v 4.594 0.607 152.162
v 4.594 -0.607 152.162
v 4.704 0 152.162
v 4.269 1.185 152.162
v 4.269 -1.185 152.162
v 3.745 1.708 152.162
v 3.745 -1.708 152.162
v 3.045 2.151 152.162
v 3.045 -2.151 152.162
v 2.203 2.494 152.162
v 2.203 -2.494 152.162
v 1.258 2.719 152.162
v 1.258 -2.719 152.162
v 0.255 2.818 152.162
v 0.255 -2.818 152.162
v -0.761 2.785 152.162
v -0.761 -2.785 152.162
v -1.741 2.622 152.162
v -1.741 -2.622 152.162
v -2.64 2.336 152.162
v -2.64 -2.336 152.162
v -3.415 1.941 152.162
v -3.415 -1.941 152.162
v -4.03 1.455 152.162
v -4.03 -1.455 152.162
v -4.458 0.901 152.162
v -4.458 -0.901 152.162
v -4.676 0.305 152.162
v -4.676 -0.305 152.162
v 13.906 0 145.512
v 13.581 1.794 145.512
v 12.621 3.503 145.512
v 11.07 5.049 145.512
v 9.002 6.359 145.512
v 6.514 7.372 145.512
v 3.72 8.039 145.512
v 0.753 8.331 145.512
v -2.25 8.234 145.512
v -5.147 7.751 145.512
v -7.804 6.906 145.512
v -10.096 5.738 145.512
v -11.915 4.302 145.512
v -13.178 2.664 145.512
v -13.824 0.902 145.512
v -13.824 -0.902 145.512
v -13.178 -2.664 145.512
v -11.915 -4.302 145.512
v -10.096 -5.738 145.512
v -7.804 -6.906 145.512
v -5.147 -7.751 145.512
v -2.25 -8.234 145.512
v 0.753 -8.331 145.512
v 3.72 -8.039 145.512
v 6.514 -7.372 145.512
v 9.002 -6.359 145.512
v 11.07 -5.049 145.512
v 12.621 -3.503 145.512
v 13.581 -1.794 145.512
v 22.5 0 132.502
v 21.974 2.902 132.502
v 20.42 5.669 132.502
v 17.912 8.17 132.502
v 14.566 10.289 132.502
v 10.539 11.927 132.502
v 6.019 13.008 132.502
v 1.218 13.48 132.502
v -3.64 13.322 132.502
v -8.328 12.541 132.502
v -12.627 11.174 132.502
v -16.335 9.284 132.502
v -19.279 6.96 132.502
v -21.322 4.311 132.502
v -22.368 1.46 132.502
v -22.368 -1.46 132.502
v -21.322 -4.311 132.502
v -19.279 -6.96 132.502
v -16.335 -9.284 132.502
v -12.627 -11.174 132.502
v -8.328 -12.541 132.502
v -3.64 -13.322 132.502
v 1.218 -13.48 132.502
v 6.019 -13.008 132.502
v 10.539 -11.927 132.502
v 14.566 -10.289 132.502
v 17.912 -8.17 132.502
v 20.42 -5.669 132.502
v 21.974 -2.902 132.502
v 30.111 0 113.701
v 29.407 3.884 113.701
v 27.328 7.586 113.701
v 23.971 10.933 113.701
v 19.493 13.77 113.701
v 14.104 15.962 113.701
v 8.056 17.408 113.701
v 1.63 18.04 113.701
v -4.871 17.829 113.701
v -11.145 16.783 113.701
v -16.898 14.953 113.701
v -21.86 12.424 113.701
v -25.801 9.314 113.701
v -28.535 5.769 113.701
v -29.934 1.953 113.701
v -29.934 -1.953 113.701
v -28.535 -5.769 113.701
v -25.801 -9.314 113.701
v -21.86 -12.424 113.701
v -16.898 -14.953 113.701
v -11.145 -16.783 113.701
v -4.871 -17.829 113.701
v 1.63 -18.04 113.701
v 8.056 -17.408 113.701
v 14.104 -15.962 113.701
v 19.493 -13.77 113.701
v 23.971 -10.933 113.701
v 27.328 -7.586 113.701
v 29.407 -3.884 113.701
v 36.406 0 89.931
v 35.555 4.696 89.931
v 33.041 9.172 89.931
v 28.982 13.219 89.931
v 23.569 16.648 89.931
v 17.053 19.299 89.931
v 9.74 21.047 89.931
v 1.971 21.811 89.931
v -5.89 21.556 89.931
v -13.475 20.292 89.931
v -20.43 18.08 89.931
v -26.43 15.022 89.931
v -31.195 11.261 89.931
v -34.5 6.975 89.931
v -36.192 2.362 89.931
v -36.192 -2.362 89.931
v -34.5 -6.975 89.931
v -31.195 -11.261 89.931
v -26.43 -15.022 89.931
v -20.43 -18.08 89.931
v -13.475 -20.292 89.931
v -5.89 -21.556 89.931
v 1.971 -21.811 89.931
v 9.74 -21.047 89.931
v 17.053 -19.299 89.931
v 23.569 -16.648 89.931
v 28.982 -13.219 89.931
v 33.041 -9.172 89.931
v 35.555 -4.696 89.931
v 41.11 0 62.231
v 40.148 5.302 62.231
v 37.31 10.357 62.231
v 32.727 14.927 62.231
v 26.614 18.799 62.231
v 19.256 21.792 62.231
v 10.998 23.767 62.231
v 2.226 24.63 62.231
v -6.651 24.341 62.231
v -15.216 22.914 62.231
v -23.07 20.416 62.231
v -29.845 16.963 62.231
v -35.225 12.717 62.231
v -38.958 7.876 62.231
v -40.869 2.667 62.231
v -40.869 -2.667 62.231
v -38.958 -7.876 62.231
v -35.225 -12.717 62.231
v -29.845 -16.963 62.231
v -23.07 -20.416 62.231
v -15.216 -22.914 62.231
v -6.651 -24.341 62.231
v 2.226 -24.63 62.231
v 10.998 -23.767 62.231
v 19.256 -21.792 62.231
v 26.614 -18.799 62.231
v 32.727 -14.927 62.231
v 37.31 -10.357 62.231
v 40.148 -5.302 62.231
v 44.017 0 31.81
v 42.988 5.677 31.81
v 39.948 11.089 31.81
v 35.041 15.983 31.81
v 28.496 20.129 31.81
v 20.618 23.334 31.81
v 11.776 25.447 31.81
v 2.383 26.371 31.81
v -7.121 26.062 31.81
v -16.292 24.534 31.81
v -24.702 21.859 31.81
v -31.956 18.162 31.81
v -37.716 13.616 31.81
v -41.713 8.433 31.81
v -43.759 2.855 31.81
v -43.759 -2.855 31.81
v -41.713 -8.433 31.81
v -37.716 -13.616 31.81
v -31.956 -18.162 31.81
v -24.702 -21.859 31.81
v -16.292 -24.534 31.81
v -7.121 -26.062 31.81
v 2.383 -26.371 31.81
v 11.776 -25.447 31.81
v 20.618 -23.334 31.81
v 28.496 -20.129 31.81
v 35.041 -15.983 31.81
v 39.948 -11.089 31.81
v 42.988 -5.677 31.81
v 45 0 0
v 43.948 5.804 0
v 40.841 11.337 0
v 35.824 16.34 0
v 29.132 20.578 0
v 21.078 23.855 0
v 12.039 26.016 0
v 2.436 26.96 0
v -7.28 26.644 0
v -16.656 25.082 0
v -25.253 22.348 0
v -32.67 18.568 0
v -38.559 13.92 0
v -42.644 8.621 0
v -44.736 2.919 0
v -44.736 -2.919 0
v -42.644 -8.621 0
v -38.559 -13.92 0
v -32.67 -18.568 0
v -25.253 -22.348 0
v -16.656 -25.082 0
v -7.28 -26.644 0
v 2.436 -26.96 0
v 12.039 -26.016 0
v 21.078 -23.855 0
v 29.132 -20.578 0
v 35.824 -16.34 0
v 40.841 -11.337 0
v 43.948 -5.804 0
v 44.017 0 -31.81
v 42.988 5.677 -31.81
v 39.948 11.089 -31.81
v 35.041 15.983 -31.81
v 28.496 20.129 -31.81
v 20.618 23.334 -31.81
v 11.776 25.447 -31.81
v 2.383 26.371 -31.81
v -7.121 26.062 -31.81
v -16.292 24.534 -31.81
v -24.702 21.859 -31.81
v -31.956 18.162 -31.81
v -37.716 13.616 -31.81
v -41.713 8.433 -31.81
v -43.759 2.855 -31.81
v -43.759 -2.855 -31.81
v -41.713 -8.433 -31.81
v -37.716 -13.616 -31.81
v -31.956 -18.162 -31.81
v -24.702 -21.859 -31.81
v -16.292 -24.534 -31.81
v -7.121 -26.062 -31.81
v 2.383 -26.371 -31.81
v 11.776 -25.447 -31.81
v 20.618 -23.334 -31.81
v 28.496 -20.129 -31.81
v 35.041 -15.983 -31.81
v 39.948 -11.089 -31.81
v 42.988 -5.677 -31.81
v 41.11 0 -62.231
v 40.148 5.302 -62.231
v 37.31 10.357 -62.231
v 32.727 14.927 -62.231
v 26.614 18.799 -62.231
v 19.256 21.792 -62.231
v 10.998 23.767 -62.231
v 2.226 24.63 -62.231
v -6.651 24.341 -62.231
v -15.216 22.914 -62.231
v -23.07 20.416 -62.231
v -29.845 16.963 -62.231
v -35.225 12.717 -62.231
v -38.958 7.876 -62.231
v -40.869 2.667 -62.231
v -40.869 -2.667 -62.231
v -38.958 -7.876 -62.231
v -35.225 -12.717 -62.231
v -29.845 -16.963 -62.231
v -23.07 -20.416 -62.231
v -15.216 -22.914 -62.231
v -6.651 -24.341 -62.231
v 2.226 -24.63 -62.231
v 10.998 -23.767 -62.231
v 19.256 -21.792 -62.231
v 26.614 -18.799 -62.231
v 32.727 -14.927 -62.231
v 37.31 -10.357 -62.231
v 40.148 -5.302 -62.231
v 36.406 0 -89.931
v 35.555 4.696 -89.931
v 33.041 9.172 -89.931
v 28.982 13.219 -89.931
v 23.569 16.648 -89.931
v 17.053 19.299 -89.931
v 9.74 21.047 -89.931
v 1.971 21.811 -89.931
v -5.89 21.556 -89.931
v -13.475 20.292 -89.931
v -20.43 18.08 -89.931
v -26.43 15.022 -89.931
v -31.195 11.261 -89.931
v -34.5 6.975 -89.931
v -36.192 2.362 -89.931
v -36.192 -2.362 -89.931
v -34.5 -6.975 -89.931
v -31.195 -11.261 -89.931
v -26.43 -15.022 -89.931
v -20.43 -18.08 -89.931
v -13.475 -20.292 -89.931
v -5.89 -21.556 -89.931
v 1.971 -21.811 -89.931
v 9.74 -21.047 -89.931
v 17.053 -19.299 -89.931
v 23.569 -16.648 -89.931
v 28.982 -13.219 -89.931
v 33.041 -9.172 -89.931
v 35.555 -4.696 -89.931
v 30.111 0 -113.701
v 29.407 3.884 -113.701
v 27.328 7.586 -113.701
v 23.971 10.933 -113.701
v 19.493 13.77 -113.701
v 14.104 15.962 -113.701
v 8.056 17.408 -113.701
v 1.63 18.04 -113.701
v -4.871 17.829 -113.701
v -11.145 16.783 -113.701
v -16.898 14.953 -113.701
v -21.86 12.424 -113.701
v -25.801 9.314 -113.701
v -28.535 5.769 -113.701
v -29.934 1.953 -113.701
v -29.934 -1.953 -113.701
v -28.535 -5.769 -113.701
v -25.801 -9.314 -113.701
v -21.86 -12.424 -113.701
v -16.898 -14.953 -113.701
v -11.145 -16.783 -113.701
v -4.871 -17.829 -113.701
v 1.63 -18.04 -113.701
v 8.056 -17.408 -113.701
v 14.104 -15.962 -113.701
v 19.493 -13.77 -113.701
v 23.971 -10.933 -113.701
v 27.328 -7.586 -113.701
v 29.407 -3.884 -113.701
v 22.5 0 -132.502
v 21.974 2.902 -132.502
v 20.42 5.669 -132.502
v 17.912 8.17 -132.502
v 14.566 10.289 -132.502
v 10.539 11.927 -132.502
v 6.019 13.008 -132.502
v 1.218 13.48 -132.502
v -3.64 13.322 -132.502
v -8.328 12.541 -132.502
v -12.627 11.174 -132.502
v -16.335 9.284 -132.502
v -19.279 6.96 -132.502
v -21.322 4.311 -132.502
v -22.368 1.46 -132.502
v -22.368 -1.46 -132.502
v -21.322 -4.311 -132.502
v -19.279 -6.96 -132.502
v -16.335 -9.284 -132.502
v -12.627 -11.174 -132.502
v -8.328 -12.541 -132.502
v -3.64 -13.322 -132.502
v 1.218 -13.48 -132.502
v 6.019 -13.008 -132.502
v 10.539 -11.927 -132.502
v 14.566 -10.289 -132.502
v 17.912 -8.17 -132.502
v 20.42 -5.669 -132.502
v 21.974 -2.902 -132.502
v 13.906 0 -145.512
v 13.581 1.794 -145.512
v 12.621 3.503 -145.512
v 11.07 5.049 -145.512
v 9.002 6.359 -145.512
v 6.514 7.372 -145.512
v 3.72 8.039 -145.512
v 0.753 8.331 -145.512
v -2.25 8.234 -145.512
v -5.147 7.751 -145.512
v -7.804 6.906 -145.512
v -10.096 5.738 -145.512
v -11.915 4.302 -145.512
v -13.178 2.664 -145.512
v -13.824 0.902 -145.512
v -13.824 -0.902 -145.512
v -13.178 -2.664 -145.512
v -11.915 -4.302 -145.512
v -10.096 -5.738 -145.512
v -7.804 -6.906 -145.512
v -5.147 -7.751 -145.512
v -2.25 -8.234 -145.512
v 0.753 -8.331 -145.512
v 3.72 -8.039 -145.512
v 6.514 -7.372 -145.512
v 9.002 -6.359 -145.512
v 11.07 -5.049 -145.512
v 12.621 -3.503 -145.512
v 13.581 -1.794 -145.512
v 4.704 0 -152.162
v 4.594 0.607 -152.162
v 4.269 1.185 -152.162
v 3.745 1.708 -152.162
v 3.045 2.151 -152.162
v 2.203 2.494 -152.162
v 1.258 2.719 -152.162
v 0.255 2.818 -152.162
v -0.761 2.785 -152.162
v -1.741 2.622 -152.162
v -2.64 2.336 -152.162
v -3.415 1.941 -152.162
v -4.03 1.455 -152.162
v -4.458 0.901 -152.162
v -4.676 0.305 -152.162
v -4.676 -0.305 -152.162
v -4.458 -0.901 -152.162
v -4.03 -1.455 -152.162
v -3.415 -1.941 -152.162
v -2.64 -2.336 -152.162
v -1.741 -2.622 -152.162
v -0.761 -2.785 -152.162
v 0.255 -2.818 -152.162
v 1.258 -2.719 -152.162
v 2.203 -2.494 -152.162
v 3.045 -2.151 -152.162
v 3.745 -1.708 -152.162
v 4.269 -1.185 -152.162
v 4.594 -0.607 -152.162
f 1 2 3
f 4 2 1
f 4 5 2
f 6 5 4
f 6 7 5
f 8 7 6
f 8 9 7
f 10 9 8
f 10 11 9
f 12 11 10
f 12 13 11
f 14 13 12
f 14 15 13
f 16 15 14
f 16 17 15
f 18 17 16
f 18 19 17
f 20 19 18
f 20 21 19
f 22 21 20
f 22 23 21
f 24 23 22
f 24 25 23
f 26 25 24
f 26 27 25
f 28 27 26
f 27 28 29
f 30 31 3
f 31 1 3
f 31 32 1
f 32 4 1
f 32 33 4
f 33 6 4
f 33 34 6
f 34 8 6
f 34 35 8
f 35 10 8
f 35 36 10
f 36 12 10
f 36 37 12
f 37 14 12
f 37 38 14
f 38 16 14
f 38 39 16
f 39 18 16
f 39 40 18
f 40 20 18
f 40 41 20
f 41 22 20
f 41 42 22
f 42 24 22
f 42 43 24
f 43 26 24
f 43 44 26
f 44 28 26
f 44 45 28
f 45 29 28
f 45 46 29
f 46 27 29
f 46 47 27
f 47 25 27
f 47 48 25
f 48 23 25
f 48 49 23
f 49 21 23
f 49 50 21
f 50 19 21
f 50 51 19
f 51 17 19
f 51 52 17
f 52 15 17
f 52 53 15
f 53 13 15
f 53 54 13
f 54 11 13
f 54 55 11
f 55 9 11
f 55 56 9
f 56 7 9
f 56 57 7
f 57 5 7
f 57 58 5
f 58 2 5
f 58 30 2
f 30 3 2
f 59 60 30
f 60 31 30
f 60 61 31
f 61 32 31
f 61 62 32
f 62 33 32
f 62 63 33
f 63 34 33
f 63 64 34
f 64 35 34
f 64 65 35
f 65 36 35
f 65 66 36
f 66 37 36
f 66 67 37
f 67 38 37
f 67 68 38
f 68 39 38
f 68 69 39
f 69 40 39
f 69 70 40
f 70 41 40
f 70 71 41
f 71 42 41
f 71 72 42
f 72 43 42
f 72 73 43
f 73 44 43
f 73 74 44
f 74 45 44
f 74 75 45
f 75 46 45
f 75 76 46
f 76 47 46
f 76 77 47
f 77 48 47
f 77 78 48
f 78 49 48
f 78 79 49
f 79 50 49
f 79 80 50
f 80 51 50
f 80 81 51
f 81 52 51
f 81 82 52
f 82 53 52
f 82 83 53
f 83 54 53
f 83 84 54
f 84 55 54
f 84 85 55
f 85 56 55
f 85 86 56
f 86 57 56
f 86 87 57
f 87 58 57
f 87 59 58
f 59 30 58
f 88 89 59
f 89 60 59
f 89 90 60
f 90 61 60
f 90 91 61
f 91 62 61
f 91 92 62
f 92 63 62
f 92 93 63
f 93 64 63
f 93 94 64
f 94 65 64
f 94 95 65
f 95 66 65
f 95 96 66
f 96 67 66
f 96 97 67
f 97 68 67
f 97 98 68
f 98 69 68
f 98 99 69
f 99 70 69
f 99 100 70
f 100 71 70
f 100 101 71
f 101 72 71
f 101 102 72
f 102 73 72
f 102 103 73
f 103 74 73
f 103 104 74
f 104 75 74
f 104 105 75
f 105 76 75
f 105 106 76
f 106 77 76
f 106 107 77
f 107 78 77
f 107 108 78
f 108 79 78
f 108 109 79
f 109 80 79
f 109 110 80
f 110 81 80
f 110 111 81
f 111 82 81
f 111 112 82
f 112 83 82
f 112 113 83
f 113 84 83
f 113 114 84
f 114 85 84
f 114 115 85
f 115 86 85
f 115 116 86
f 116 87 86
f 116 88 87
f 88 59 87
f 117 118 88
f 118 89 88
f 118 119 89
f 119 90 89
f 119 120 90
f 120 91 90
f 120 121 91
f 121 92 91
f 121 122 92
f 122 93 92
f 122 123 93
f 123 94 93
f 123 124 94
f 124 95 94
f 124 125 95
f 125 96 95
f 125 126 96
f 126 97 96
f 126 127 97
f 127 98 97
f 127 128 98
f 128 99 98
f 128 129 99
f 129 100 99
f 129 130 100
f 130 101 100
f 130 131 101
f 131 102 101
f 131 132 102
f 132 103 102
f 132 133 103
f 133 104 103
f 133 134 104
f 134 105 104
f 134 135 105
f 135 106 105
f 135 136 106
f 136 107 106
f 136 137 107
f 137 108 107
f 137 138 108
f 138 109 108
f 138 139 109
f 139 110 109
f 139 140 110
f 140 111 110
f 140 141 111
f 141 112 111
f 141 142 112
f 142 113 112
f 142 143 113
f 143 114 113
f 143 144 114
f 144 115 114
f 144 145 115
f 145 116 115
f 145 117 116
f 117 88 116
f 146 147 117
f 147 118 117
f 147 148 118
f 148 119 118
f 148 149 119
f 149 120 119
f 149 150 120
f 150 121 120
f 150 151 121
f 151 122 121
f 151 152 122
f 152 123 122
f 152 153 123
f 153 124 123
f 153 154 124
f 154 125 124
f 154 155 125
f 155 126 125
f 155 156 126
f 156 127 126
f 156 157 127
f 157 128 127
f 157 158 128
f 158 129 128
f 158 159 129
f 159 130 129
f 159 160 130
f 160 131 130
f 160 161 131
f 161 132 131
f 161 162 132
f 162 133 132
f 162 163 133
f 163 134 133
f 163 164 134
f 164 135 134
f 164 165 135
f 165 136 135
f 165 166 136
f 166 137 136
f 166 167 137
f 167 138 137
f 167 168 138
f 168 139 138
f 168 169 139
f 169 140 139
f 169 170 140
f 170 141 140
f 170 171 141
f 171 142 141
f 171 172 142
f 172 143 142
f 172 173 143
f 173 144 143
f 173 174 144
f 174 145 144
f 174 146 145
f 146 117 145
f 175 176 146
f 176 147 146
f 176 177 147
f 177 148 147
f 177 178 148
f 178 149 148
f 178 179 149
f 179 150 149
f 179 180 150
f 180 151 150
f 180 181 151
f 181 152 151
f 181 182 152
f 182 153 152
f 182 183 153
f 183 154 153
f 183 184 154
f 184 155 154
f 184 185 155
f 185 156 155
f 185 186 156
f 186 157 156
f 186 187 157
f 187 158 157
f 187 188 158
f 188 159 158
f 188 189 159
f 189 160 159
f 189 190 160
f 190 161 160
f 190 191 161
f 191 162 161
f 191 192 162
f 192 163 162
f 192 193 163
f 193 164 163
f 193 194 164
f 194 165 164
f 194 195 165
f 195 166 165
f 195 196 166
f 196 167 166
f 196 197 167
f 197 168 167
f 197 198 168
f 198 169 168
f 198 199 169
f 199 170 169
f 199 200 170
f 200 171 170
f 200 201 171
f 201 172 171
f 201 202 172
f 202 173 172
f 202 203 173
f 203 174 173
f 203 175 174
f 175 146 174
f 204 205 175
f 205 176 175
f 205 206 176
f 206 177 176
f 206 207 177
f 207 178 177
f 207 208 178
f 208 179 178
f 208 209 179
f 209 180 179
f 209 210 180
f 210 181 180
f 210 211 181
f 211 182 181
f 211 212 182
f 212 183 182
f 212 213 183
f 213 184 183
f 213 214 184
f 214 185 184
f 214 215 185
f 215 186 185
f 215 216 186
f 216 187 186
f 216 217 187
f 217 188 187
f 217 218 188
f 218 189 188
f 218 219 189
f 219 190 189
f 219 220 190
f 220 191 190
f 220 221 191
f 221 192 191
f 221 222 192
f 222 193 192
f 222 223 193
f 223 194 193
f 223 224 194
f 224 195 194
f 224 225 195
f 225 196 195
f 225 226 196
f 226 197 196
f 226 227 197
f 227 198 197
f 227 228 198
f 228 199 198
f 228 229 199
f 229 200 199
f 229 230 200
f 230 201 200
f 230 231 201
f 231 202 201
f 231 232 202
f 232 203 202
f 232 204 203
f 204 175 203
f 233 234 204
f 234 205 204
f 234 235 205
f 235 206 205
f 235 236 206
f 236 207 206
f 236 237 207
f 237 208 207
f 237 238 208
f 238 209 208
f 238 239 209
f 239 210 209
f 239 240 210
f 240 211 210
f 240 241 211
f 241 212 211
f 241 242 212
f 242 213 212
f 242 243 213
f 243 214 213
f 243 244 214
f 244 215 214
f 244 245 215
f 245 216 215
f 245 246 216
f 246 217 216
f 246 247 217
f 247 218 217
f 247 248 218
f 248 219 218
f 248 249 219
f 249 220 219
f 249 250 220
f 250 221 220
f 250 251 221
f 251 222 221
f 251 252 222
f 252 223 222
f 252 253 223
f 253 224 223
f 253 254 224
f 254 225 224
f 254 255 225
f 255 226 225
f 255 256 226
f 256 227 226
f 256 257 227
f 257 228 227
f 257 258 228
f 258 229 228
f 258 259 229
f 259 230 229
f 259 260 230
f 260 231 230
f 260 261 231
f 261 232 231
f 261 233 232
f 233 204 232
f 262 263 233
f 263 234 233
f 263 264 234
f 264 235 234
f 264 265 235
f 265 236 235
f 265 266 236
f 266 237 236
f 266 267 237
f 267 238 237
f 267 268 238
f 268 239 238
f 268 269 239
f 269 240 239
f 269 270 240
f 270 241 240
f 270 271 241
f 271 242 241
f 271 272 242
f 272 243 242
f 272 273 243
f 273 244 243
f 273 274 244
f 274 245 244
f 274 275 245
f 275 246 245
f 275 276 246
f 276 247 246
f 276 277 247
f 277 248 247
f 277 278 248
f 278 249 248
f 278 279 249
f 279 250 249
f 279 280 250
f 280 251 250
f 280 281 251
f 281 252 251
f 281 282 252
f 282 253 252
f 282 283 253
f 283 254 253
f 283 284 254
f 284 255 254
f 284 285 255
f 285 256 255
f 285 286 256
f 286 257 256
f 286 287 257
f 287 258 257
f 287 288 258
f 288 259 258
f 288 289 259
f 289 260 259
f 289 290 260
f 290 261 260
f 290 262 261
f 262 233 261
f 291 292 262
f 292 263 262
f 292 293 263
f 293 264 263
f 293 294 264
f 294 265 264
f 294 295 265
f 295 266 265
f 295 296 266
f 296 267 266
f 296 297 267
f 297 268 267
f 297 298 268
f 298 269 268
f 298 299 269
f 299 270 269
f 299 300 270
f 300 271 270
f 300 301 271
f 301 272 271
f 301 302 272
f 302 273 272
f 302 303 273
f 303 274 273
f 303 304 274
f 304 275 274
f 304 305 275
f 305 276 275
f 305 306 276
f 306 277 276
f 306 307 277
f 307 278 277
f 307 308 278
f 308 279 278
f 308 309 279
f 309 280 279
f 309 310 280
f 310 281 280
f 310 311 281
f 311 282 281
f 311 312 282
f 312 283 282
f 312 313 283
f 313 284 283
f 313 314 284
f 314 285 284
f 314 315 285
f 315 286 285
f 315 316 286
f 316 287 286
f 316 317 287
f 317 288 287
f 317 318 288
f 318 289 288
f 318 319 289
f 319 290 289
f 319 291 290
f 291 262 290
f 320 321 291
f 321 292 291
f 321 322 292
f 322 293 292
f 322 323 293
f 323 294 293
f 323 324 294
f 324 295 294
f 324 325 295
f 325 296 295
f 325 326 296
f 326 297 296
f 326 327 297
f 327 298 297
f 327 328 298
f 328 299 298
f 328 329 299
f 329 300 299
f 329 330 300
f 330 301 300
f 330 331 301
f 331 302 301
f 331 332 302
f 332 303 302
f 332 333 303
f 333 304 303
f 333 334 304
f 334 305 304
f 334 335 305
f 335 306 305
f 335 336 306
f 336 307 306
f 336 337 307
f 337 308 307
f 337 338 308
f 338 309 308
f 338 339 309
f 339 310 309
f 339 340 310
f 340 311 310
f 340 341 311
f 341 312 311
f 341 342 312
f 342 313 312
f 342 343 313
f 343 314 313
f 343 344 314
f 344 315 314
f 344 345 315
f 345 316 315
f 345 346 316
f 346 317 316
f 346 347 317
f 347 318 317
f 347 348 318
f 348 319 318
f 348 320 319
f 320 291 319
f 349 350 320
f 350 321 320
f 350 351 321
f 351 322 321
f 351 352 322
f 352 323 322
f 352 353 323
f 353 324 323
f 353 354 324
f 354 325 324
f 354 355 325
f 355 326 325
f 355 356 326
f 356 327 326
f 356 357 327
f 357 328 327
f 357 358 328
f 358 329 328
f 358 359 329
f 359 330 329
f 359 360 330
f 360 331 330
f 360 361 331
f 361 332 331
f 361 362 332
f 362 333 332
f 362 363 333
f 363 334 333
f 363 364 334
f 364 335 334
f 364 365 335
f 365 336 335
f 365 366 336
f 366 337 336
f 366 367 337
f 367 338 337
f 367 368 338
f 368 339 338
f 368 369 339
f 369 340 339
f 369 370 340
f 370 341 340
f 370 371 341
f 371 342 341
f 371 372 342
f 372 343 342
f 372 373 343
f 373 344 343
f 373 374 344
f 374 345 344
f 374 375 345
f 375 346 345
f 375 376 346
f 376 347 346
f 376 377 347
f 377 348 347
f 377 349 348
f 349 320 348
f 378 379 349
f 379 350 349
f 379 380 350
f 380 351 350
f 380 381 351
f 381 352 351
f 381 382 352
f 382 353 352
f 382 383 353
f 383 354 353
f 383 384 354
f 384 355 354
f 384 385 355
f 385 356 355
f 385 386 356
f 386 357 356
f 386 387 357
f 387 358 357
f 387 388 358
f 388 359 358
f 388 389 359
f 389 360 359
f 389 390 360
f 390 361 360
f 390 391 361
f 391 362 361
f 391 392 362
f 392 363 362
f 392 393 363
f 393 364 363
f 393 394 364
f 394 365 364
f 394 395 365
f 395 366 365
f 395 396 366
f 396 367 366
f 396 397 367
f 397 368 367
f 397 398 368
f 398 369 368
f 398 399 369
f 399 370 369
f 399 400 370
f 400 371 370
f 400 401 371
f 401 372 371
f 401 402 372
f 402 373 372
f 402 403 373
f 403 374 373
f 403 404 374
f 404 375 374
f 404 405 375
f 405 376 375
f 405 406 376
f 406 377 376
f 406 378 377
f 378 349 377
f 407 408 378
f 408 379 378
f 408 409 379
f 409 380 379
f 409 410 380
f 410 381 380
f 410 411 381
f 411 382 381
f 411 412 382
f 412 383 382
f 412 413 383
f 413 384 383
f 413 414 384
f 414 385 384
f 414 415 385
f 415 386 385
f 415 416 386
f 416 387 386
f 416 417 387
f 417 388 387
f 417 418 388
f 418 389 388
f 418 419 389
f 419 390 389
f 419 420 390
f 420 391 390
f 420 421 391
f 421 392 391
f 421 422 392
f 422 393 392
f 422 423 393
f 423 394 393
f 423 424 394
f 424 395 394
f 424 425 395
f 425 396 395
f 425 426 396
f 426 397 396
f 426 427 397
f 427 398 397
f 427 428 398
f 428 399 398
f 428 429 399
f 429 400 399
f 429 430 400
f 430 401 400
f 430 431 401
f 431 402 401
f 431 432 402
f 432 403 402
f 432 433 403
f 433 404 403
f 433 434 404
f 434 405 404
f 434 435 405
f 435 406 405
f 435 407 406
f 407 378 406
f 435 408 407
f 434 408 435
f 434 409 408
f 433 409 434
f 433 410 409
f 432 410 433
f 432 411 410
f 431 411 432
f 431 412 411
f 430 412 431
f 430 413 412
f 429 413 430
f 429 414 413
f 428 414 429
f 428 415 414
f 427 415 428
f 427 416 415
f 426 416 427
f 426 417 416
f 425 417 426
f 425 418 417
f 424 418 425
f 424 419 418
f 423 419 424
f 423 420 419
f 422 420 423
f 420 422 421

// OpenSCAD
// Generated by SolidPython 1.0.1 on 2020-07-29 00:46:46


scale(v = [5, 3, 17]) {
	sphere(r = 9);
}
/***********************************************
*********      SolidPython code:      **********
************************************************
 
# import packages: SolidPython
from solid import *
from solid.utils import *
from itertools import chain, combinations, permutations


class Resize:

    def __init__(self, scad_file):
        self.scad_file = scad_file
        #self.scad_file = import_scad(scad_file)
        # cone/cylinder param:
        self.r1 = 0
        self.r2 = 0
        self.h = 0
        # rectangular prism param:
        self.w = 0
        self.l = 0
        # ellipse param:
        self.r = 0

    # import OpenScad code (file name corresponds to shape)


    # classify shape + parameters
    def assign(self, param1, param2, param3):
        if self.scad_file == 'cone.scad':
            self.r1 = param1
            self.r2 = param2
            self.h = param3
        elif self.scad_file == 'cylinder.scad':
            self.r1 = param1
            self.r2 = param2
            self.h = param3
        elif self.scad_file == 'rectangularPrism.scad':
            self.h = param1
            self.l = param2
            self.w = param3
        else:
            self.r = param1
            self.h = param2

    # resize parameters
    def iterate(self):
        x = range(3, 20, 2)
        i = 1
        if self.scad_file == 'cone.scad':
            tempList = list(permutations(x, 2))
            for temp in tempList:
                param1 = temp[0]
                param2 = temp[1]
                filepath = 'produced_scad_files/' + 'cone' + str(param1) + '_' + str(param2) + '_' + '.scad'
                scad_render_to_file(cylinder(h=param1, r1=param2, r2=0), filepath)

        elif self.scad_file == 'cylinder.scad':
            tempList = list(permutations(x, 3))
            for temp in tempList:
                param1 = temp[0]
                param2 = temp[1]
                filepath = 'produced_scad_files/' + 'cylinder' + str(param1) + '_' + str(param2) + '_' + '.scad'
                scad_render_to_file(cylinder(h=param1, r1=param2, r2=param2), filepath)

        elif self.scad_file == 'rectangularPrism.scad':
            tempList = list(permutations(x, 3))
            for temp in tempList:
                param1 = temp[0]
                param2 = temp[1]
                param3 = temp[2]
                filepath = 'produced_scad_files/' + 'rectangularPrism' + str(param1) + '_' + str(param2) + '_' + str(
                    param3) + '.scad'
                scad_render_to_file(cube(size=(param1, param2, param3)), filepath)

        elif self.scad_file == 'ellipse.scad':
            tempList = list(permutations(x, 4))
            for temp in tempList:
                param1 = temp[0]
                param2 = temp[1]
                param3 = temp[2]
                param4 = temp[3]
                filepath = 'produced_scad_files/' + 'ellipse' + str(param1) + '_' + str(param2) + '_' + str(param3) + '_' + str(param4) + '.scad'
                scad_render_to_file(scale([param1, param2, param3])(sphere(r=param4)), filepath)

    def render_to_scadfile(self):
        scad_render_to_file(scad, 'example.scad') 
 
************************************************/
